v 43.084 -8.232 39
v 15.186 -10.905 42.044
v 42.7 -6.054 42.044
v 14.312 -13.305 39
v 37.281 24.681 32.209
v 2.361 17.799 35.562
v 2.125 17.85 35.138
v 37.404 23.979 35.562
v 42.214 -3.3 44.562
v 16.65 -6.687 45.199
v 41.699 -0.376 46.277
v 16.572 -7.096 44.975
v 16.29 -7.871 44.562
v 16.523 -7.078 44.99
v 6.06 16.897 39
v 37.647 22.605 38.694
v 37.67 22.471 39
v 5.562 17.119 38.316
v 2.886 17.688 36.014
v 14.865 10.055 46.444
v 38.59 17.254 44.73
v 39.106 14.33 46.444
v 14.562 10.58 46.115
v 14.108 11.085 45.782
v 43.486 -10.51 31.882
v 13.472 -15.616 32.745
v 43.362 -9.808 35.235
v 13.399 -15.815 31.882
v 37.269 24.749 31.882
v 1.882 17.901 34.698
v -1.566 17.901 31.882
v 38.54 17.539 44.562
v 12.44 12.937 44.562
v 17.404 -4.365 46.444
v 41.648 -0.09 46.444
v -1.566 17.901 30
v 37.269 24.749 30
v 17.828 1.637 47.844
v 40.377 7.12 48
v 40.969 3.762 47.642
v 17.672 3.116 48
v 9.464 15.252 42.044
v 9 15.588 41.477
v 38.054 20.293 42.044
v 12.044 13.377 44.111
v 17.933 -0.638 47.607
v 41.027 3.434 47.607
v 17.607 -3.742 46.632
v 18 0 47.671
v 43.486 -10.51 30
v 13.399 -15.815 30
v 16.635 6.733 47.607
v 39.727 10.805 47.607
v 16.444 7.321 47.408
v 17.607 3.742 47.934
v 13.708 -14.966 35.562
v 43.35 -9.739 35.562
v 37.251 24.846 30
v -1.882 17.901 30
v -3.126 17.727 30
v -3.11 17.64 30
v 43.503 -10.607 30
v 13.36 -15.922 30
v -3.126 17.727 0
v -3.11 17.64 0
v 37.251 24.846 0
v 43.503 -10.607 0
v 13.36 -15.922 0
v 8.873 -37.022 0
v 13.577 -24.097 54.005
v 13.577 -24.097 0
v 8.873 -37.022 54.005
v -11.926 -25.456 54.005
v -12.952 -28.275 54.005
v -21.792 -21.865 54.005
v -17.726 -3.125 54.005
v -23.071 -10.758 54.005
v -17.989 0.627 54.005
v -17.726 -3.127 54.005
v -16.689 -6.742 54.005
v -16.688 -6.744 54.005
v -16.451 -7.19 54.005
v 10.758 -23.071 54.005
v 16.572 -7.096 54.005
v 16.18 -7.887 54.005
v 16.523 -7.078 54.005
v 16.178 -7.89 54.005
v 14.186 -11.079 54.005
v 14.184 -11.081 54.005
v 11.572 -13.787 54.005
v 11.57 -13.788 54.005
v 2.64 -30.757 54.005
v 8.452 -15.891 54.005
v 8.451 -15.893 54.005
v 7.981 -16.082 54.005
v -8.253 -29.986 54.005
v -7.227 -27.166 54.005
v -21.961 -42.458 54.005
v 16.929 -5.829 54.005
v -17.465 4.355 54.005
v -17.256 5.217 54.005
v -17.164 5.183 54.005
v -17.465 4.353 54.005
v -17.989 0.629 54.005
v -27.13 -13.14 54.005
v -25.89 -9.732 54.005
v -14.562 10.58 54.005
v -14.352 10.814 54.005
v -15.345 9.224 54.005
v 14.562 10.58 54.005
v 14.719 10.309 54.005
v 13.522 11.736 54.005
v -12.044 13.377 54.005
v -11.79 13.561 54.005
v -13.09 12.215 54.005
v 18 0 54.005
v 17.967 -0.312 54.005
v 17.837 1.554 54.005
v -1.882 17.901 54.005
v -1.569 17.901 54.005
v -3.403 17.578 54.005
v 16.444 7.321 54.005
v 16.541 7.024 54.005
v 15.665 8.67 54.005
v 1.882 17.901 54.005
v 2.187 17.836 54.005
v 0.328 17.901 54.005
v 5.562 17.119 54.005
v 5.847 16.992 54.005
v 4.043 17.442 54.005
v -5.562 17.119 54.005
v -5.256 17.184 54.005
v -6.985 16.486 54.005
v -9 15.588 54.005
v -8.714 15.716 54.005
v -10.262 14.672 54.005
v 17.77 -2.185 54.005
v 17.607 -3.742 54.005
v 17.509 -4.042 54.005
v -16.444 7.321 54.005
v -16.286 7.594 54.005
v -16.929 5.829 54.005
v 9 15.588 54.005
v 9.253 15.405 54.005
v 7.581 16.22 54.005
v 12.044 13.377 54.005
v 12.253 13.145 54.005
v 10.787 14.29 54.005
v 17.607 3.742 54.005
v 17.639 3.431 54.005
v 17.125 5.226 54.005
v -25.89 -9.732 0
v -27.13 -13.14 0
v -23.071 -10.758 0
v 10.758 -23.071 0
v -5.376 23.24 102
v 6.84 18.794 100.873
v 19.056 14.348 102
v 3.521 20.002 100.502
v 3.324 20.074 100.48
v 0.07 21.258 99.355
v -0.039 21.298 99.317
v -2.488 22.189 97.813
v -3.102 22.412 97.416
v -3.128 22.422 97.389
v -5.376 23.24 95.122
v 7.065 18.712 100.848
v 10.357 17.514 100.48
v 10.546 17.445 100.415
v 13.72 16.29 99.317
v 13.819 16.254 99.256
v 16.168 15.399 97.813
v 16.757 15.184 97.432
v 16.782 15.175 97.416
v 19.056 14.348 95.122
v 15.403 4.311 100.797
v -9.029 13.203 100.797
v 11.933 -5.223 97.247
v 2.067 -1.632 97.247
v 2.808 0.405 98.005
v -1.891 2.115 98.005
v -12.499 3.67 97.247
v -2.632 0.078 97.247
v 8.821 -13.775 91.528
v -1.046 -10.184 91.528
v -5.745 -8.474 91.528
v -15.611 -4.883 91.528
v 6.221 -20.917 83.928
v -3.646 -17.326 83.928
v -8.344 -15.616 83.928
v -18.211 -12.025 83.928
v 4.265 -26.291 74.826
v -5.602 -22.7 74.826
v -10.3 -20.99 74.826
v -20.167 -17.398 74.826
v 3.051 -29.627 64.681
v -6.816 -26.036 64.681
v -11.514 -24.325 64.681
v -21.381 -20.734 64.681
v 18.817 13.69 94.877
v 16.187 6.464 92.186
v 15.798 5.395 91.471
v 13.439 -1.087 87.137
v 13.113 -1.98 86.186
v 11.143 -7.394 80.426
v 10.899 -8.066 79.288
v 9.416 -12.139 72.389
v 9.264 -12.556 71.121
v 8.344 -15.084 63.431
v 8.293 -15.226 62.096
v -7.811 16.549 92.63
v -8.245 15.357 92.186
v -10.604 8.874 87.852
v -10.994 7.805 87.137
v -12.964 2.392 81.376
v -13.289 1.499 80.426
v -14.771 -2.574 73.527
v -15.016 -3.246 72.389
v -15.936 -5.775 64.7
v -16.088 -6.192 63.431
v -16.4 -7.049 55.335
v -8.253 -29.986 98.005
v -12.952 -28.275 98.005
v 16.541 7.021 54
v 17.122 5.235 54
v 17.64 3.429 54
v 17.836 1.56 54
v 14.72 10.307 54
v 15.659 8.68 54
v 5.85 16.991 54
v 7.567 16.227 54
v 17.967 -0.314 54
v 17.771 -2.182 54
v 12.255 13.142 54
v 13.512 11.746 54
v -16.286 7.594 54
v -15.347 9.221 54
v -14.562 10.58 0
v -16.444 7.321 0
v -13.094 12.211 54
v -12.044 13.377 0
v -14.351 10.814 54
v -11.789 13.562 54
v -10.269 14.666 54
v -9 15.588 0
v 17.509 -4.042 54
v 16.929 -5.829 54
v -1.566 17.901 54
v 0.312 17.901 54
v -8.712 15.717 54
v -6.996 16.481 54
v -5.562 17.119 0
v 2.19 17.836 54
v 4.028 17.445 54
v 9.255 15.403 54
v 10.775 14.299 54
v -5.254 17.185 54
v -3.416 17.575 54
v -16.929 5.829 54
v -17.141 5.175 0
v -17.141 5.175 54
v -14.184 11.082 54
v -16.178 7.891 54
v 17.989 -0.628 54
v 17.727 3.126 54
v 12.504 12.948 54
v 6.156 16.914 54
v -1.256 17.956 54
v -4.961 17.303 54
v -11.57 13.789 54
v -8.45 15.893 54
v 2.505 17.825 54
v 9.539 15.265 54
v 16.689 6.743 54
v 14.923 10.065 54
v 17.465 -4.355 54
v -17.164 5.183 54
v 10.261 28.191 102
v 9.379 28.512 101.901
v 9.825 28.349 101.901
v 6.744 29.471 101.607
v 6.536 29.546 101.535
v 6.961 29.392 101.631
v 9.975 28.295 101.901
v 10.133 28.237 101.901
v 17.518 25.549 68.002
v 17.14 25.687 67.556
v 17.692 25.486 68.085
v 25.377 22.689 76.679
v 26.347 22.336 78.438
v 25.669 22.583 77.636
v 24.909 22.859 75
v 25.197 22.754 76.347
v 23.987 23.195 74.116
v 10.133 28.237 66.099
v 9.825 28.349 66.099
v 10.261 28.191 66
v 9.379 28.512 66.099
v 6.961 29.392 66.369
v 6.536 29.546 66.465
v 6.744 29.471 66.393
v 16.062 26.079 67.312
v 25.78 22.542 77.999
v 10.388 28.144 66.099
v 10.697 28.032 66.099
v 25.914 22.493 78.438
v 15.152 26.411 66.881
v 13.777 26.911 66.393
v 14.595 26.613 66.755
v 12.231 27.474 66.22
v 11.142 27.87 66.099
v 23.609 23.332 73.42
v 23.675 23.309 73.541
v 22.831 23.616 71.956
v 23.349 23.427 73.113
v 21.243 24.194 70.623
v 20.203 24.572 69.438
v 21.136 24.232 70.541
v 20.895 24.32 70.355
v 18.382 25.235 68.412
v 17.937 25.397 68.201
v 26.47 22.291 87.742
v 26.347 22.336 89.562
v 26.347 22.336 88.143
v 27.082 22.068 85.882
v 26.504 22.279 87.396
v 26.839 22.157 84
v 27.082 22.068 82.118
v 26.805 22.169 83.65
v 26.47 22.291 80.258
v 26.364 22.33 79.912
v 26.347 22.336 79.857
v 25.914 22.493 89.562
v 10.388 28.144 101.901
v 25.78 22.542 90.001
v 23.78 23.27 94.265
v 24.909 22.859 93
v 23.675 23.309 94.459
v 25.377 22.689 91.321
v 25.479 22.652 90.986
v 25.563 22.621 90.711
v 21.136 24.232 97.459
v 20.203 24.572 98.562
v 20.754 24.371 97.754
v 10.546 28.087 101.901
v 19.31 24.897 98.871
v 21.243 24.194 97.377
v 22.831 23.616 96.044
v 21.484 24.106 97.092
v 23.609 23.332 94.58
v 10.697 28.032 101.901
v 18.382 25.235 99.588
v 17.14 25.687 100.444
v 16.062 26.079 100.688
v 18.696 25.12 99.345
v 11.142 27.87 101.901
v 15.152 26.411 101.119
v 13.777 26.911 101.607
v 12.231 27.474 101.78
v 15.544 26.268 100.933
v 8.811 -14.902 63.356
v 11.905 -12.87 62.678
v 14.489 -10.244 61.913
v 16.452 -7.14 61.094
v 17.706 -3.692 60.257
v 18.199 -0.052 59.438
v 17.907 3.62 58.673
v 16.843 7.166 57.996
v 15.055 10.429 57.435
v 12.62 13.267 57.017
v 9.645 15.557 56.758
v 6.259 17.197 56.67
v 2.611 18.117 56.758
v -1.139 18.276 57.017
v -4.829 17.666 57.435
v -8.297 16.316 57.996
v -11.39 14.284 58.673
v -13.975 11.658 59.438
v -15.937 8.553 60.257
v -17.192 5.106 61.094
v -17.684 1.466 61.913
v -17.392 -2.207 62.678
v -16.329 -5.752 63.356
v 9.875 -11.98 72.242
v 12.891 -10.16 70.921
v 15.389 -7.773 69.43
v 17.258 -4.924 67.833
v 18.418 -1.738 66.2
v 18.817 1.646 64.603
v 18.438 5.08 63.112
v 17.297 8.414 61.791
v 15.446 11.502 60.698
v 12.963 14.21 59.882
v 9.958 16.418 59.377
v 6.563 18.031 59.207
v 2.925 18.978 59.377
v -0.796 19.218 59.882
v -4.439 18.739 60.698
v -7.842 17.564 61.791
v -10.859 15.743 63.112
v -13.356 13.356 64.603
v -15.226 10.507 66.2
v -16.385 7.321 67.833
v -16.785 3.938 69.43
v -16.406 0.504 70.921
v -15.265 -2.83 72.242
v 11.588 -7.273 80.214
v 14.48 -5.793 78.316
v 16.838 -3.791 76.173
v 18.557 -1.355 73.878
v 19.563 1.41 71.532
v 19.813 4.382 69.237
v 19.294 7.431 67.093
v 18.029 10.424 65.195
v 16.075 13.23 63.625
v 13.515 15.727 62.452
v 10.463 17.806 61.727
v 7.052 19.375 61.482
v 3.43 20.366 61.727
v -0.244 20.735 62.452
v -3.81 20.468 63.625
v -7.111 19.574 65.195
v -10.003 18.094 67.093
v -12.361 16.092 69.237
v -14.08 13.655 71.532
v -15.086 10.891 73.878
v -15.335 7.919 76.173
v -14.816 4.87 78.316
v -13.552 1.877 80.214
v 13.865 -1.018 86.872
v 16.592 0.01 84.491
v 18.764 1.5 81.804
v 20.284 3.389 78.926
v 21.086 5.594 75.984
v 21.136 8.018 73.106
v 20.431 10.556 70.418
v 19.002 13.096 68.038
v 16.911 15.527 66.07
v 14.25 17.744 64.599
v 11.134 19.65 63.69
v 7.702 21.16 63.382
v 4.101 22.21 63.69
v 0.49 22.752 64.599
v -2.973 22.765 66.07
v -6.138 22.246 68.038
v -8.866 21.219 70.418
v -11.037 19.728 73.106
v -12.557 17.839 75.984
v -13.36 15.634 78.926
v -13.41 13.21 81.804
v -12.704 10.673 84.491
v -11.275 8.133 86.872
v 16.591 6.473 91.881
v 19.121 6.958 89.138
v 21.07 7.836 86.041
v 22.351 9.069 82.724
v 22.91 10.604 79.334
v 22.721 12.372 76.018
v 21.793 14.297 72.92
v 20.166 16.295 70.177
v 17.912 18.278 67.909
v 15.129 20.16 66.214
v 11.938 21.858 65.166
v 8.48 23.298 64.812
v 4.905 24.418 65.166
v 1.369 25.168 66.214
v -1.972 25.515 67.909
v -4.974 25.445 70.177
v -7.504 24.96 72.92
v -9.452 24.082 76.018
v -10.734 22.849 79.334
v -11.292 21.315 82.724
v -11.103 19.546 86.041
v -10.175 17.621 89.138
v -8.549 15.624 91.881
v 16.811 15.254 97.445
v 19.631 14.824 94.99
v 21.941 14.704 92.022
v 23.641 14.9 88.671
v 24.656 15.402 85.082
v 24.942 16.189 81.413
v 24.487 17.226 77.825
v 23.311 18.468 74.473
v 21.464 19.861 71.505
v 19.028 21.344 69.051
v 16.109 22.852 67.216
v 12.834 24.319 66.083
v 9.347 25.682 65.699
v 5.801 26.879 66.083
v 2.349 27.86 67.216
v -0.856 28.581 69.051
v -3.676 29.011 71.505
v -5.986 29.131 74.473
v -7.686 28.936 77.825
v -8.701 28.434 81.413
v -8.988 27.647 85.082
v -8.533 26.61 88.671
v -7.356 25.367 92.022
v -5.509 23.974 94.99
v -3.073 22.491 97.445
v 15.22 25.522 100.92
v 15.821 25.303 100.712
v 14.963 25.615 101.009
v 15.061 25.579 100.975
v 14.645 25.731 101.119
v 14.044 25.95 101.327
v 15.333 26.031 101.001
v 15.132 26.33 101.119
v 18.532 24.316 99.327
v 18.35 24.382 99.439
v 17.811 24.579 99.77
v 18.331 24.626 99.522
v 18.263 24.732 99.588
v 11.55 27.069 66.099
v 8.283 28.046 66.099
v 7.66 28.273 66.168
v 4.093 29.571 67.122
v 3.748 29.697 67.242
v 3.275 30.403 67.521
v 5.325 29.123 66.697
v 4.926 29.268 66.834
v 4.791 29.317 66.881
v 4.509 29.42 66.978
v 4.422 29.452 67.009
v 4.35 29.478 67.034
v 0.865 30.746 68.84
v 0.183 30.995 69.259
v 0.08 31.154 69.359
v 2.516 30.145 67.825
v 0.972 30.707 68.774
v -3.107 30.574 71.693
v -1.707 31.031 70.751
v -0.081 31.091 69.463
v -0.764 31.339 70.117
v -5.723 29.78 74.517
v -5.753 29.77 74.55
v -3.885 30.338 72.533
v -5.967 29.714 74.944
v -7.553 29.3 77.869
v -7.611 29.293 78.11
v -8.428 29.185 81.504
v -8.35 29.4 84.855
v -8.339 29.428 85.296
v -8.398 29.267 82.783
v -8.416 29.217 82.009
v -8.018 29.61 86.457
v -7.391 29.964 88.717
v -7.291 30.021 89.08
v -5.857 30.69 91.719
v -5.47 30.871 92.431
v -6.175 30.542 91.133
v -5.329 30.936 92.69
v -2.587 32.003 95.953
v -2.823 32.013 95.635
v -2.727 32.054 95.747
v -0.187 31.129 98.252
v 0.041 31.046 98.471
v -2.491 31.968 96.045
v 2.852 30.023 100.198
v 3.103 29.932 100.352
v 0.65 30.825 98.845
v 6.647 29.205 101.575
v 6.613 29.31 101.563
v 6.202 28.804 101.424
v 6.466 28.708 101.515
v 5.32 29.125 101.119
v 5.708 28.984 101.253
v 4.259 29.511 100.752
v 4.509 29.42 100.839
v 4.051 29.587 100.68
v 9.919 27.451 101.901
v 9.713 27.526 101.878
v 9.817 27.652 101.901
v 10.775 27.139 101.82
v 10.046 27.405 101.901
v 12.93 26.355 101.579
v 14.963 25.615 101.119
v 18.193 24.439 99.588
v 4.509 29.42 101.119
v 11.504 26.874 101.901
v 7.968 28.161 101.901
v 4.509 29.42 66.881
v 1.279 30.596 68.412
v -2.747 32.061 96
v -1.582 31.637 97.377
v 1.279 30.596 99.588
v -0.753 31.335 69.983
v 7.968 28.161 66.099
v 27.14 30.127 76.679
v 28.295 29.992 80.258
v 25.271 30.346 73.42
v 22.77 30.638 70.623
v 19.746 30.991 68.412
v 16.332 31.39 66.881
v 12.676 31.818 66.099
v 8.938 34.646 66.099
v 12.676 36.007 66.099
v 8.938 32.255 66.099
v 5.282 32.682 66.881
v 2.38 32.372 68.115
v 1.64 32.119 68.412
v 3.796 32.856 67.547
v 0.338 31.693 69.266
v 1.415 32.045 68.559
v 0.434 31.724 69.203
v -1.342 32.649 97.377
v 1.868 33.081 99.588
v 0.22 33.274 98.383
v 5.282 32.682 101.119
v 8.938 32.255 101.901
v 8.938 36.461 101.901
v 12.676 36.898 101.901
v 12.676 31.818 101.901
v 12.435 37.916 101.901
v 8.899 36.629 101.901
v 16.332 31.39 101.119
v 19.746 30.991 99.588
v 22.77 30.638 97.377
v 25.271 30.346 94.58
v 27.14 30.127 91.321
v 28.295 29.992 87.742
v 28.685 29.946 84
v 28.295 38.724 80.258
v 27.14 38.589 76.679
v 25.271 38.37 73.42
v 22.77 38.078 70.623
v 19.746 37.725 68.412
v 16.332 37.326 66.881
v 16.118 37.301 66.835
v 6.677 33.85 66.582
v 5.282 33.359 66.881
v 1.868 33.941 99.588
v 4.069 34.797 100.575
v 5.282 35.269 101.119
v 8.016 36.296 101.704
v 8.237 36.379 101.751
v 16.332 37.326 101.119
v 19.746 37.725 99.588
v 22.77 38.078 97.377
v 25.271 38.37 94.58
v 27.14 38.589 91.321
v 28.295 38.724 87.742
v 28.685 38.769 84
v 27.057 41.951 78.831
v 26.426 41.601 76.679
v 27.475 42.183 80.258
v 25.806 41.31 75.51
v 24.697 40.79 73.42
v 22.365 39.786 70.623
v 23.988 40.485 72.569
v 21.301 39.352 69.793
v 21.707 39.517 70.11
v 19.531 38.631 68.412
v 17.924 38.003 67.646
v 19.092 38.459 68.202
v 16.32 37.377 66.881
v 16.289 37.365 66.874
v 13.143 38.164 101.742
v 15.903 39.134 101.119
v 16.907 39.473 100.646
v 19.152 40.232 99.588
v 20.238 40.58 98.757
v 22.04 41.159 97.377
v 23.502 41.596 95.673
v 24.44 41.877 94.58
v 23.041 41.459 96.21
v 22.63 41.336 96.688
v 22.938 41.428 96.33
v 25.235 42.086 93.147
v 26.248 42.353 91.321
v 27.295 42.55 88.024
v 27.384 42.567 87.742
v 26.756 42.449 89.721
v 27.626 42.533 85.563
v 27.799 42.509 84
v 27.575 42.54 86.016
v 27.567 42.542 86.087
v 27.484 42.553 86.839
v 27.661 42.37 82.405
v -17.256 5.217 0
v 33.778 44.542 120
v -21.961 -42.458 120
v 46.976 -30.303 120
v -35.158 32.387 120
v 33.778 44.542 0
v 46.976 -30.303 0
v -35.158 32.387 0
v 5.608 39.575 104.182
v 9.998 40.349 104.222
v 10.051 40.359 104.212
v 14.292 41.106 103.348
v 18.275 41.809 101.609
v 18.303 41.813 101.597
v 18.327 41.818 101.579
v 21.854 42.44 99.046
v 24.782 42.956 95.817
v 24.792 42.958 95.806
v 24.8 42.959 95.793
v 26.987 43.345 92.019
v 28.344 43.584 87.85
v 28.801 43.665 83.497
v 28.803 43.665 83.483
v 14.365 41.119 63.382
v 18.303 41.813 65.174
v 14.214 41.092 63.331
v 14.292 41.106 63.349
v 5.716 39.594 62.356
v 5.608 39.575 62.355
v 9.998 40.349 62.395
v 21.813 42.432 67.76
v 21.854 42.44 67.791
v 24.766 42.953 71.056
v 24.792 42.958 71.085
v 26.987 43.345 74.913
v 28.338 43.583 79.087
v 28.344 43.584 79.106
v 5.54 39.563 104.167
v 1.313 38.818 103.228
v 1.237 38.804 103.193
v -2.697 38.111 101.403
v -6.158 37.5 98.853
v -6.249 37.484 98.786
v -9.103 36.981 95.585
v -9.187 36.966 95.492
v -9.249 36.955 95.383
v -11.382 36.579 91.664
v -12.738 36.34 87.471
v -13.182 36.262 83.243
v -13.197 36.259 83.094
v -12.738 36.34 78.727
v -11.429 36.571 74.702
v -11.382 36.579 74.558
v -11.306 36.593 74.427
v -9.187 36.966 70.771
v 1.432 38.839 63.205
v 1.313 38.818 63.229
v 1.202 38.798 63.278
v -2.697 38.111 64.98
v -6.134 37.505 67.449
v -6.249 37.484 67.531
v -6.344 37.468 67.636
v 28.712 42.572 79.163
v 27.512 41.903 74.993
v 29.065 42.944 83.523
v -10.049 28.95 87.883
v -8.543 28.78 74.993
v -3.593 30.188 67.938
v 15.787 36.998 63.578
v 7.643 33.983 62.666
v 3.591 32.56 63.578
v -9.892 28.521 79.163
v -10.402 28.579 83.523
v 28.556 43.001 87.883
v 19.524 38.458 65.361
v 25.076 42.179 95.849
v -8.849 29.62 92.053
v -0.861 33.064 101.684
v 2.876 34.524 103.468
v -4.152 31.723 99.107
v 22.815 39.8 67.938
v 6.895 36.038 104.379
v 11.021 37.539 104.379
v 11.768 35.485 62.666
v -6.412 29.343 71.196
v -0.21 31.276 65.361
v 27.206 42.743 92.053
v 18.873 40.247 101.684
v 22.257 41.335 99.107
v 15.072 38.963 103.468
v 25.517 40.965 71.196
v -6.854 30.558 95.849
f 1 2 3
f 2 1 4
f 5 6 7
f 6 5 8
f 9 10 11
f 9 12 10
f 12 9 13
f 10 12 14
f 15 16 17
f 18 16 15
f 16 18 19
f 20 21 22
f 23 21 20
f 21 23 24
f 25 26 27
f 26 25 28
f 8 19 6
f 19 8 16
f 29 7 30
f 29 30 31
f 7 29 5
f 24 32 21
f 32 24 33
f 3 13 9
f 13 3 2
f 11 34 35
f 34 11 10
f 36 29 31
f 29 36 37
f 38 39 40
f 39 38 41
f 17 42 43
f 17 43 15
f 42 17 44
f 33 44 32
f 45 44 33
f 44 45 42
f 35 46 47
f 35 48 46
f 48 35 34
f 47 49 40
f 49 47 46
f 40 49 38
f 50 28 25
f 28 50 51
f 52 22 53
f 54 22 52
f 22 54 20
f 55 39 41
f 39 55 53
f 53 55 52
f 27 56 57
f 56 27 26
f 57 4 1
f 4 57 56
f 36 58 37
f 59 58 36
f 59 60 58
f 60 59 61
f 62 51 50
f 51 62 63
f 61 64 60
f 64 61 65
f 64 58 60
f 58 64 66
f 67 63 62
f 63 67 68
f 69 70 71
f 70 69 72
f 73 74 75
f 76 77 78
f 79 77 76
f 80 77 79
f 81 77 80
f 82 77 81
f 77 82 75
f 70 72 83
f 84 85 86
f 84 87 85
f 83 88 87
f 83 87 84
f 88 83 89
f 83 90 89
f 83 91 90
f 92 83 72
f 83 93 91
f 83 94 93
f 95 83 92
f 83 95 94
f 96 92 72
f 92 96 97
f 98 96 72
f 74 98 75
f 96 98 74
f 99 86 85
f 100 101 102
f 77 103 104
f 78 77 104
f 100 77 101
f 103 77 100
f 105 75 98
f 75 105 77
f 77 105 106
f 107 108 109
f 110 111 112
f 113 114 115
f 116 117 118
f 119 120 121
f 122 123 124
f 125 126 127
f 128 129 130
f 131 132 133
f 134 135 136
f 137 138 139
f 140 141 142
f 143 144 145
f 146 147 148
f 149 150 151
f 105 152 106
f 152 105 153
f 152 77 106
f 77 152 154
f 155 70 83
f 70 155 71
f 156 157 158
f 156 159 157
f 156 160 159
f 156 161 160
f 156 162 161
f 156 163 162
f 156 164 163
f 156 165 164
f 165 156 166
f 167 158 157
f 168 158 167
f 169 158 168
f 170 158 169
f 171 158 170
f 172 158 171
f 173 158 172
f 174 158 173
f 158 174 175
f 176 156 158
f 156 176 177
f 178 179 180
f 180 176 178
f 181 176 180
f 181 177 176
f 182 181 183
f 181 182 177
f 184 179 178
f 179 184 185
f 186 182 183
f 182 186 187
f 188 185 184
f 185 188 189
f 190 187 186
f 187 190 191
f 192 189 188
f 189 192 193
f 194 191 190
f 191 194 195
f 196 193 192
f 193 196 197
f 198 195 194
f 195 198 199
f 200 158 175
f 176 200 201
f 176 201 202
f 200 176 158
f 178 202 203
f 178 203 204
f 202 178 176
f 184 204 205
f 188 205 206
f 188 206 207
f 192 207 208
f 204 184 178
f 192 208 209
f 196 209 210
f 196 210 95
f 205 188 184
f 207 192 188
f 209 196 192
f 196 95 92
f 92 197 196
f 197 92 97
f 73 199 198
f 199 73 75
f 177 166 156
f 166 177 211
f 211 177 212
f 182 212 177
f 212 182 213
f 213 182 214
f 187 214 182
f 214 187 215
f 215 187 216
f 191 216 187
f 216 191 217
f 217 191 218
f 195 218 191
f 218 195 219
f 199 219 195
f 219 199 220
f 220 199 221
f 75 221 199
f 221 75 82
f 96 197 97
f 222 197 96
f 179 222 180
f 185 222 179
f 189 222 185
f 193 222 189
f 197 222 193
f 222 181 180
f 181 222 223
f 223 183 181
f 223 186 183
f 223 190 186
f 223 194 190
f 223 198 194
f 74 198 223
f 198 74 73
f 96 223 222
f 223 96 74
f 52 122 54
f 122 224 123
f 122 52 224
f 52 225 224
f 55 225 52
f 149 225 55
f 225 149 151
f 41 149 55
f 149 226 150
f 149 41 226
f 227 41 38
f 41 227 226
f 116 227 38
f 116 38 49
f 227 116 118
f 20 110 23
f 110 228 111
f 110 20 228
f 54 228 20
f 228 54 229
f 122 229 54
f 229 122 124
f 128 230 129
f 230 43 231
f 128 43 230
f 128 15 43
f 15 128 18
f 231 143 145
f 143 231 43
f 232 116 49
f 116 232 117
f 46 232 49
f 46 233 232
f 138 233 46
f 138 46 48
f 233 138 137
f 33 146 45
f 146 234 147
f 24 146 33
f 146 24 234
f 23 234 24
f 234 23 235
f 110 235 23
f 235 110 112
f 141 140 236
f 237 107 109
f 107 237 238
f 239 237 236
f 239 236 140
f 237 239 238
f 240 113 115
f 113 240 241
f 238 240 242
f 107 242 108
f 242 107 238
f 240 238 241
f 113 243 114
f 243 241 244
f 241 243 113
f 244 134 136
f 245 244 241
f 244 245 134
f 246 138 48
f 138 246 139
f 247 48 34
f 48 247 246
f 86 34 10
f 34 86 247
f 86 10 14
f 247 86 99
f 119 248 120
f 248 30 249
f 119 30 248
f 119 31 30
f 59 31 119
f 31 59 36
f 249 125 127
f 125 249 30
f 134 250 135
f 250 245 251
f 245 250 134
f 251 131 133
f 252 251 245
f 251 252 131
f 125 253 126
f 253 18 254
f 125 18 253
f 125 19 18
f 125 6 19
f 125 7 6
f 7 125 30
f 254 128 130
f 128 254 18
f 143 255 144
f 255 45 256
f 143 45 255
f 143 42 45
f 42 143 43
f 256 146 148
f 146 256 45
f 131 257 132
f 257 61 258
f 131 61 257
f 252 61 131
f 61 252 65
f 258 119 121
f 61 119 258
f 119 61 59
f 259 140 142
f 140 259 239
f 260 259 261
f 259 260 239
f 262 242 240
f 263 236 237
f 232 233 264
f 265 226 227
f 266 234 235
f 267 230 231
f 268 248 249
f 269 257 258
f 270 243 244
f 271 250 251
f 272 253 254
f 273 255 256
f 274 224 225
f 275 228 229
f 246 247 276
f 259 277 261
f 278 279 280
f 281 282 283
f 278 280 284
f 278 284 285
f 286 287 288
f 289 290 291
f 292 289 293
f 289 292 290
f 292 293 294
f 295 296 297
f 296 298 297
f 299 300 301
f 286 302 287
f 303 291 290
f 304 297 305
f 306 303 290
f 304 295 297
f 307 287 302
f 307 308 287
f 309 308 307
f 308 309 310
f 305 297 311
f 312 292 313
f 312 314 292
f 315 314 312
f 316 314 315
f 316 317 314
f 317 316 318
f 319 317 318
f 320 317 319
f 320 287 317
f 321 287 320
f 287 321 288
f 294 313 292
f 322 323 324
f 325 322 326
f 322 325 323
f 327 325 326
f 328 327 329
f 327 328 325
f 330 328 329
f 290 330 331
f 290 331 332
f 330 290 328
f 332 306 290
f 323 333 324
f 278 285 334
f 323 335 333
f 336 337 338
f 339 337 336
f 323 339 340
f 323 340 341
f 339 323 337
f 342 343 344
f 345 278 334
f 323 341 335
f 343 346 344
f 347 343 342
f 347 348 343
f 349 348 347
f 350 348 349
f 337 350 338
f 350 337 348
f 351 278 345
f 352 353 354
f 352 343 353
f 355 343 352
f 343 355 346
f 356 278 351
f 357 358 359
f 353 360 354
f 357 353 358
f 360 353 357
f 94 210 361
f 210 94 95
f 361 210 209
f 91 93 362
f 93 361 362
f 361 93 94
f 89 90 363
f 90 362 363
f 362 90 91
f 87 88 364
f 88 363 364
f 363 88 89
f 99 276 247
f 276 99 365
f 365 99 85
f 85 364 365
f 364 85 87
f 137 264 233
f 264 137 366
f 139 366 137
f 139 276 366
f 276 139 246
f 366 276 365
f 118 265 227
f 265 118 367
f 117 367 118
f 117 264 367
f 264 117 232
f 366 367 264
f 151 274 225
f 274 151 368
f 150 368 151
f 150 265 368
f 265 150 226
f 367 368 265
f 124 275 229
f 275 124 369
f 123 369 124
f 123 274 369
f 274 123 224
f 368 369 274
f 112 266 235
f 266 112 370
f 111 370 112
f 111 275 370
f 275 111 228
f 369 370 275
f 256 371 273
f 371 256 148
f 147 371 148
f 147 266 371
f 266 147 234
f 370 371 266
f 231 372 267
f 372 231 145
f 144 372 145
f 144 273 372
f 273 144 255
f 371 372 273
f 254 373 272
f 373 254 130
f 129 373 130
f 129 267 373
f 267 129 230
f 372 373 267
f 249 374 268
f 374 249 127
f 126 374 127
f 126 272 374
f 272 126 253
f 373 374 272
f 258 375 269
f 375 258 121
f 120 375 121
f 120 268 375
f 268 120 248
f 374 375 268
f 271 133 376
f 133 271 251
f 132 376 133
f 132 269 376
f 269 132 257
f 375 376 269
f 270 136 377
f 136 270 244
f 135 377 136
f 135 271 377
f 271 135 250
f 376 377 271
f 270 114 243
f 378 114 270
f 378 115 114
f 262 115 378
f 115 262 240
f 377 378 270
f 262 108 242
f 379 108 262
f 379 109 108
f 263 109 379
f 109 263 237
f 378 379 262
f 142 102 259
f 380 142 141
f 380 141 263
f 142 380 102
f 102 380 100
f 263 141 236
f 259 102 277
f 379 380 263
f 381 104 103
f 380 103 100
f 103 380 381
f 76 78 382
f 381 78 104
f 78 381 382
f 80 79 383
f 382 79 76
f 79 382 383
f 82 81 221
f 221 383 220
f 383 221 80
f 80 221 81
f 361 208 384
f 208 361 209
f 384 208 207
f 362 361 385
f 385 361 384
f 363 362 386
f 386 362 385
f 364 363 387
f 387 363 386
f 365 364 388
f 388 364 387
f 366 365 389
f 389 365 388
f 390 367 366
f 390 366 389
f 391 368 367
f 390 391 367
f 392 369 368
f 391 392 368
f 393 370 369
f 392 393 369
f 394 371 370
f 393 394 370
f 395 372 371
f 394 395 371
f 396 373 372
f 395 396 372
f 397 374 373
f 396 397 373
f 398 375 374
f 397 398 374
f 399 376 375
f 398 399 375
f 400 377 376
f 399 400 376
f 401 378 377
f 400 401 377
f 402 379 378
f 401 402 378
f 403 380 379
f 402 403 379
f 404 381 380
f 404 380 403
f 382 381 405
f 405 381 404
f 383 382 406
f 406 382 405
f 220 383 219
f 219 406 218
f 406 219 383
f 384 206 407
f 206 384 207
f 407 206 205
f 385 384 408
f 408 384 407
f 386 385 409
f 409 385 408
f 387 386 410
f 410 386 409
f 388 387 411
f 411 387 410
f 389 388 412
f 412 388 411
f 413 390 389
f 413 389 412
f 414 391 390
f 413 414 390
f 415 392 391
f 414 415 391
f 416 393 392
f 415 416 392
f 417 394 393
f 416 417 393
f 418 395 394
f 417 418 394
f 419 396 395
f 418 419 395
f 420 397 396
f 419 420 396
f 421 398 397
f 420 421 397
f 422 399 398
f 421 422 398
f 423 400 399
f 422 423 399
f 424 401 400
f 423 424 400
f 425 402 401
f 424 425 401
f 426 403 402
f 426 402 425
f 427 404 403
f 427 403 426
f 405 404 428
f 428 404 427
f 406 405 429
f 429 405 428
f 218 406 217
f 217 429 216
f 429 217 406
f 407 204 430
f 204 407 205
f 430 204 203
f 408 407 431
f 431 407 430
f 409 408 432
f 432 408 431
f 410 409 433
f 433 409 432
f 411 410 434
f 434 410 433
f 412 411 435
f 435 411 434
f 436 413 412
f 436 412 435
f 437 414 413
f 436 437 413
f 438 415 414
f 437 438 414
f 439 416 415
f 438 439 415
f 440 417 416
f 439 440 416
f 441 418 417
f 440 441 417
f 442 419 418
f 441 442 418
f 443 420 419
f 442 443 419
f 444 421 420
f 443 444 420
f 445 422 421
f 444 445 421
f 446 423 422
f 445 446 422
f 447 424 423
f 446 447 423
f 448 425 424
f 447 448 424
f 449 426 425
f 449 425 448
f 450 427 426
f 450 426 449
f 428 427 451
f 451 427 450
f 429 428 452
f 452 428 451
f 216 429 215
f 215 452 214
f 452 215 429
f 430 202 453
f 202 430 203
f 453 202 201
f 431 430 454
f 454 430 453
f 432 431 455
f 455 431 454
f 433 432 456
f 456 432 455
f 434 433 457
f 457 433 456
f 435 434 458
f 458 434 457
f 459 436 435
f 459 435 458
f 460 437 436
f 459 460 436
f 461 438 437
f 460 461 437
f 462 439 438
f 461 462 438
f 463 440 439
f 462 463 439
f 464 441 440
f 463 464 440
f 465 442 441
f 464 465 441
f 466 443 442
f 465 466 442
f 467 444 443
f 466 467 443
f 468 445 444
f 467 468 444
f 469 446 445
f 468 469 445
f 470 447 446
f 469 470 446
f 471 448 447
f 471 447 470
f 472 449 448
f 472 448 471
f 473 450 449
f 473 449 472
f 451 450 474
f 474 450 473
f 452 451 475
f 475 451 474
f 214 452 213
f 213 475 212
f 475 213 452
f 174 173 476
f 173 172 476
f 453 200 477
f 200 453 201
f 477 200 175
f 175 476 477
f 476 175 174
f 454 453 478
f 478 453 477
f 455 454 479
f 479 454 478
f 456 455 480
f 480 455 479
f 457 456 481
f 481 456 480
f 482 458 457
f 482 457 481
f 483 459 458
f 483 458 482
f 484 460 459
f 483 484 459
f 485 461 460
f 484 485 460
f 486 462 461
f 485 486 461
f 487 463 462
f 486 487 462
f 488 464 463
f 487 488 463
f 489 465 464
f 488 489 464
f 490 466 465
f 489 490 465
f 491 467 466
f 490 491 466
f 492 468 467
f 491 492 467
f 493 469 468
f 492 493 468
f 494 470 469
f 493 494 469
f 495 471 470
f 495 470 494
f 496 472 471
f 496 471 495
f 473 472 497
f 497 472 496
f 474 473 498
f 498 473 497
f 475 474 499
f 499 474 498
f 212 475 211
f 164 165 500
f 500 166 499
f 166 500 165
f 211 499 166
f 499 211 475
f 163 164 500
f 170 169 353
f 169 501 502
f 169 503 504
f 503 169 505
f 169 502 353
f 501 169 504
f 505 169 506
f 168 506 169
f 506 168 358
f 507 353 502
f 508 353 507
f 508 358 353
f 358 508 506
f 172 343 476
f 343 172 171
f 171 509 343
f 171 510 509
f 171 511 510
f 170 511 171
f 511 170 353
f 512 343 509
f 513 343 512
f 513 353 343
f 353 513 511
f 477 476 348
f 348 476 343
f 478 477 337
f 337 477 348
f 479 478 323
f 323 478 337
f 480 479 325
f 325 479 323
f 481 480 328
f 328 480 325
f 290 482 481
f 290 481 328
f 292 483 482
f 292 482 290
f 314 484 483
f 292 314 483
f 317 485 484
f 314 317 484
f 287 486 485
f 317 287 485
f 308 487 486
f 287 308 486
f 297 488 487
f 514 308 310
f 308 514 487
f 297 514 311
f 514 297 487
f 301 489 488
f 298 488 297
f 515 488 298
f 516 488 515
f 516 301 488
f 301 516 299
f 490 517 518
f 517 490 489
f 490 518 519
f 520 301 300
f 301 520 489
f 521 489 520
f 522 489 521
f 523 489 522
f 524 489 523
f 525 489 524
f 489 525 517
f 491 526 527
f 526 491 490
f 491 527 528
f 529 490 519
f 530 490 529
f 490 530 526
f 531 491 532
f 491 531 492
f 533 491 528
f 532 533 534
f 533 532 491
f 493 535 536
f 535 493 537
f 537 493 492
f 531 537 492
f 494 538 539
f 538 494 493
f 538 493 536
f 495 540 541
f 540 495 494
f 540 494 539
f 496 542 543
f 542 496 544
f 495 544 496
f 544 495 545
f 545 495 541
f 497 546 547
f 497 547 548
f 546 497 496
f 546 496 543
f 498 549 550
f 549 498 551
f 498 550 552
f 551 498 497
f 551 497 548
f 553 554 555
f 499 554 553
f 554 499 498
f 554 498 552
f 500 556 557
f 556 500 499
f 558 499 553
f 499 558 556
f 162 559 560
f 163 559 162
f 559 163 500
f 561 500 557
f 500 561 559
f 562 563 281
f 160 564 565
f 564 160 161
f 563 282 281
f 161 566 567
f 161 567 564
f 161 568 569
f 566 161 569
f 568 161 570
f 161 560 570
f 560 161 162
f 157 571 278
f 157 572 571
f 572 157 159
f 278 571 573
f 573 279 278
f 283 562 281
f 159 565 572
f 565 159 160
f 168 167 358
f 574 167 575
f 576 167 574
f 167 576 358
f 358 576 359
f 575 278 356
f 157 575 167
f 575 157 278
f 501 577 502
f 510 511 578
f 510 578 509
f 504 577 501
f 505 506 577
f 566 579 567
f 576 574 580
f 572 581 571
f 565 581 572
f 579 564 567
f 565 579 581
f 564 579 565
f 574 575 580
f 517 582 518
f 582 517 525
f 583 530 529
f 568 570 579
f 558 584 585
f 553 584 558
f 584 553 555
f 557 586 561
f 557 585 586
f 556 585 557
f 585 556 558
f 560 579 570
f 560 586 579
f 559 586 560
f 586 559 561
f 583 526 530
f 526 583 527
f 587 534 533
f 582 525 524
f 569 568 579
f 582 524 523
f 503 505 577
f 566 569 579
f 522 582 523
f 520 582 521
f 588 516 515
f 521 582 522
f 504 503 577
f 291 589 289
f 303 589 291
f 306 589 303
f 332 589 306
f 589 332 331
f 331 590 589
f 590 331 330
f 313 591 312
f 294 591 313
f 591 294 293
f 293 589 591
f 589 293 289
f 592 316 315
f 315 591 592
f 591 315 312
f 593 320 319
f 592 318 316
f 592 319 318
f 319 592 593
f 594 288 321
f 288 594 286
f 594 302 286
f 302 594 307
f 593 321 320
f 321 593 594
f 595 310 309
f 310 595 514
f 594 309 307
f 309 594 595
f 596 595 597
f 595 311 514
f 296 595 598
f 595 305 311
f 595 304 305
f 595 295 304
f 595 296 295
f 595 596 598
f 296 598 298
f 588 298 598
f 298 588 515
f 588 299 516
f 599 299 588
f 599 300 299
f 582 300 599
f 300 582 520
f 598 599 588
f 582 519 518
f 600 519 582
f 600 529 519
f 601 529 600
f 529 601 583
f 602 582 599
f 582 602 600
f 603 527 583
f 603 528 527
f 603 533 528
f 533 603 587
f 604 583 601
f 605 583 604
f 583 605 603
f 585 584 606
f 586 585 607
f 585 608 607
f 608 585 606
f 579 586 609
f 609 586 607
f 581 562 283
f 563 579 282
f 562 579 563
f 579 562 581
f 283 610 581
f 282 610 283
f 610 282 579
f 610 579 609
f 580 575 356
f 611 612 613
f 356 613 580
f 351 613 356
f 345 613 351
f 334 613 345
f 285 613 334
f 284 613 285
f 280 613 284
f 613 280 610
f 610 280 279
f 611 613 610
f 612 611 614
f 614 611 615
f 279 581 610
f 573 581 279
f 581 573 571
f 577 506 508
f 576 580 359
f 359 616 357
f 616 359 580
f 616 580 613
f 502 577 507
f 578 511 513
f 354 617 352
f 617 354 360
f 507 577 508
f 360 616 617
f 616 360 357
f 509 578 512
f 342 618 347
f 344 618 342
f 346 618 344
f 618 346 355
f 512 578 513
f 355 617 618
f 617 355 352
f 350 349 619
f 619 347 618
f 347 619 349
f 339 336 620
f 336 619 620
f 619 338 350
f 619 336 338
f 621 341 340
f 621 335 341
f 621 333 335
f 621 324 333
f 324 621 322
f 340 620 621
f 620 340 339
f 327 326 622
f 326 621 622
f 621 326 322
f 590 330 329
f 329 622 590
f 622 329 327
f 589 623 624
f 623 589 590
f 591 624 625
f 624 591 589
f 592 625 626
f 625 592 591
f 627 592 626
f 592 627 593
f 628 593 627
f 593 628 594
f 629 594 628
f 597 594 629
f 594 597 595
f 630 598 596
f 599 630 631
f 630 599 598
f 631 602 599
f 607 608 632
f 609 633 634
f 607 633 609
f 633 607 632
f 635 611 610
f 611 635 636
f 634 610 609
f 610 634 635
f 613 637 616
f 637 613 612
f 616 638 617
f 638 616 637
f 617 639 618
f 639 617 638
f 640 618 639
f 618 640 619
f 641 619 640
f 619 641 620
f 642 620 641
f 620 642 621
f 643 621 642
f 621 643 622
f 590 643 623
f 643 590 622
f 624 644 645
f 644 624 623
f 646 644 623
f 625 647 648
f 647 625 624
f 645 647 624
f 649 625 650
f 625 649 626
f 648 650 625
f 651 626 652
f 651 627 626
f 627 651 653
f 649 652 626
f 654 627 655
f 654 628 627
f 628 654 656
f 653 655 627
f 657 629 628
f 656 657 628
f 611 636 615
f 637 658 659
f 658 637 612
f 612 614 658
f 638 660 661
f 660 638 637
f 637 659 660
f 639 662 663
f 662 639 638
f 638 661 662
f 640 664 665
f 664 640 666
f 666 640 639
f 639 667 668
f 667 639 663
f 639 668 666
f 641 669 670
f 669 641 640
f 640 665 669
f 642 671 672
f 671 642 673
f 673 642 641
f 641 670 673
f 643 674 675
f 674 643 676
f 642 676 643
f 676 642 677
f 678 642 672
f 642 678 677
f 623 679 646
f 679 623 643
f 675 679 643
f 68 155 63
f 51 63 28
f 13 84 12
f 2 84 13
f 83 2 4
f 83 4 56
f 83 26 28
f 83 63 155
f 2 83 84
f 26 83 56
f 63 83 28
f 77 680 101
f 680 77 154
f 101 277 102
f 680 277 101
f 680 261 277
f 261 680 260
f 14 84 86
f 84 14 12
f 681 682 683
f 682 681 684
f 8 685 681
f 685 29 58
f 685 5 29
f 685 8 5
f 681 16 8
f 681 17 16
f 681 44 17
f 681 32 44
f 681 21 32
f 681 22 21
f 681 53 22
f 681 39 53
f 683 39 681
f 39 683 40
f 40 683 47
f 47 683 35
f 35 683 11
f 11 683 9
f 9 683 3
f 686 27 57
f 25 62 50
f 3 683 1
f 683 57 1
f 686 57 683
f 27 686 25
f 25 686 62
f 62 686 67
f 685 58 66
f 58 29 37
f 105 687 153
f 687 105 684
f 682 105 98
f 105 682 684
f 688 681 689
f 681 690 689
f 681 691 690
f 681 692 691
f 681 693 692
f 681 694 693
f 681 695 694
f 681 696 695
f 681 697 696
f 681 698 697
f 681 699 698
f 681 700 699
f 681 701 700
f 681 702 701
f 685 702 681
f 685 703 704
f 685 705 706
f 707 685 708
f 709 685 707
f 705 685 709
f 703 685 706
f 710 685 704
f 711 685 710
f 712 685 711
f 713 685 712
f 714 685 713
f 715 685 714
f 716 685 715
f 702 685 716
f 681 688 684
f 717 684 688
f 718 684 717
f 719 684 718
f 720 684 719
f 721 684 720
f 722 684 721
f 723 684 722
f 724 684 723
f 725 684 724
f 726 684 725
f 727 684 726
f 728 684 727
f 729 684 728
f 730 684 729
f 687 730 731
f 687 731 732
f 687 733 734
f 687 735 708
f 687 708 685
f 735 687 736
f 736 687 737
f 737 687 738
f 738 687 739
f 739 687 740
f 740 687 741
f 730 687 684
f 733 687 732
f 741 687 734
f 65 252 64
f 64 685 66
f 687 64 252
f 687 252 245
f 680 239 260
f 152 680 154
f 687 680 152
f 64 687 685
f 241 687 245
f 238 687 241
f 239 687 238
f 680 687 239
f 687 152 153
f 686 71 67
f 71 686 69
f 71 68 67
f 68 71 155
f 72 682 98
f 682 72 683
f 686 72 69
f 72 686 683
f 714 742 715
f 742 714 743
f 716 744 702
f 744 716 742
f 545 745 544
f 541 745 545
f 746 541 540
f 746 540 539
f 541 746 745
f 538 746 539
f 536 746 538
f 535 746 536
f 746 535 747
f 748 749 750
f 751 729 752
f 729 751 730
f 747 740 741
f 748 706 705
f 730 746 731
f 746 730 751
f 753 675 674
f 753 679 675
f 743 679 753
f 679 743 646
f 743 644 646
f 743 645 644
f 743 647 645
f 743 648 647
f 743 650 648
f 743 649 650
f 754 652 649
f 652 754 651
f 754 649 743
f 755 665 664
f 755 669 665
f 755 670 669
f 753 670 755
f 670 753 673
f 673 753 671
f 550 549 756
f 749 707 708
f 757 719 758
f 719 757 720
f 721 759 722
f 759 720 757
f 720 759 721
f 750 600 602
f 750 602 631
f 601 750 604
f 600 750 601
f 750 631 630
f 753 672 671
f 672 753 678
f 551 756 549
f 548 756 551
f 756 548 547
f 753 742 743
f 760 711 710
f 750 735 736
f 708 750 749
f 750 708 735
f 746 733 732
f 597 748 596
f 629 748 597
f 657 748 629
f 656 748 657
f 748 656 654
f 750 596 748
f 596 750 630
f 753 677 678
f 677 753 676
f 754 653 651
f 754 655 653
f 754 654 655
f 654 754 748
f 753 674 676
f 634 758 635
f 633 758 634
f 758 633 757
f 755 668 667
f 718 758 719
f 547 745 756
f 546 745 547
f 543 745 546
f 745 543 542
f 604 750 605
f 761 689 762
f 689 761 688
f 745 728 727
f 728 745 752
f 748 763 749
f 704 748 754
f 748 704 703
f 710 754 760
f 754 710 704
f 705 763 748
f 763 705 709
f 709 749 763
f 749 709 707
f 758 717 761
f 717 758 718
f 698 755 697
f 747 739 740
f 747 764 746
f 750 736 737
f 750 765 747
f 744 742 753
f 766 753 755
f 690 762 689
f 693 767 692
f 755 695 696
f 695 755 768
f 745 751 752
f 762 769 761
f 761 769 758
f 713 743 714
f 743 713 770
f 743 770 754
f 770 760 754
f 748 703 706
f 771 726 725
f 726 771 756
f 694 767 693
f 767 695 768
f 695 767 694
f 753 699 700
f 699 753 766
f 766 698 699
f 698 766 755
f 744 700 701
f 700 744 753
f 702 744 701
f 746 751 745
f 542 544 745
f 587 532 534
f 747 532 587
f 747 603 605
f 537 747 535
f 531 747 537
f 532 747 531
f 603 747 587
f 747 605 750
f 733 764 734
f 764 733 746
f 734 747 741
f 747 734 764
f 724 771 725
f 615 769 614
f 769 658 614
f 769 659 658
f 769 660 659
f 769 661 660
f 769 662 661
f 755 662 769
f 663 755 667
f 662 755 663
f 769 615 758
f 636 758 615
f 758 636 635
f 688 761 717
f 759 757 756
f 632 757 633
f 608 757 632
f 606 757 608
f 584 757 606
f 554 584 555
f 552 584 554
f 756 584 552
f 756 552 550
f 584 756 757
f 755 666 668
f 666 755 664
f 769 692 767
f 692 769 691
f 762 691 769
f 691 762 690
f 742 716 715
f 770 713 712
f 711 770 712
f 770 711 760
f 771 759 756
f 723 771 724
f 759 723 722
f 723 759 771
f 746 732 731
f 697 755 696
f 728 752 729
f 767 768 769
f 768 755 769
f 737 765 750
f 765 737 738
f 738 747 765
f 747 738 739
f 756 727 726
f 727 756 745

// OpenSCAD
// ******************************************** //
// *                                          * //
// *  Cover for a VUK on home-brew pinball    * //
// *                                          * //
// *  Dorus van der Linden                    * //
// *  Willem Godlieb                          * //
// *                                          * //
// *  Version 0.2                             * //
// *                                          * //
// *  To Do:                                  * //
// *    - Add holes for inserts M3            * //
// *    - Create ball path variables          * //
// *    -                                     * //
// *                                          * //
// ******************************************** //



// ******************************************** //
// *                                          * //
// *                Instructions              * //
// *                                          * //
// *  Definition of origin                    * //
// *    Centre x, left allign y , and zero z  * //
// *    Then extra translations as needed     * //
// *                                          * //
// *  All angles are counter clockwise        * //
// *    as seen from outside of axis          * //
// *                                          * //
// *  Create 3 elements:                      * //
// *  A - VUK Case Cube at z-angle 10         * //
// *  B - PVC Tube at z-angle 20, x-angle -3  * //
// *  C - Ballpath & VUK at z-angle -20       * //
// *                                          * //
// *  Final product is difference A-B-C       * //
// *                                          * //
// *        playfield is at y-angle -5        * //
// *                                          * //
// *                                          * //
// ******************************************** //



// ******************************************** //
// *                Variables                 * //
// ******************************************** //


// *                Render Resolution
// *                
//$fn=180;

// *                Margins
// *   
// Margin for objects to be merged or removed
MarginSize=0.010;
//MarginSize=10;

MarginTranslate=MarginSize/2;


// *                VUK Case Cube
// *                
// VUK Case Cube - Size
Case_x=70;
Case_y=76;
Case_z=120;

// VUK Case Cube - Positioning
Case_Translation        = [6,0,0];                  // Translation of VUK case
Case_Rotation           = [0,0,10];                 // Rotation of VUK case
Case_RotationReverse    = [0,0,-10];                // Rotation of VUK case


// *                PVC tube
// *
// PVC Tube - Size
PVC_ID                  = 36;                       // PVC tube inner diameter
PVC_WT                  = 3;                        // PVC tube wall thickness
PVC_OD                  = PVC_ID + 2* PVC_WT;       // PVC tube outer diameter = 42
LenghtHorizontalPVC     = 240;                      // PVC tube lenghts - NOT PRINTED

// PVC Tube - Positioning 
PVC_dx                  = 21;                       // How far should the tupe be away from x=0 
PVC_dy                  = 26;                       // How far should the tupe be away from y=0 
PVC_dz                  = 64;                       // How far should the tupe be away from z=0 
PVC_Translation         = [PVC_dx,PVC_dy,PVC_dz];   // Total translation of the tube
PVC_Rotation            = [-3,0,20];                // Rotation of tube

// *                VUK & Ball Path 
// * 
// VUK
VUK_Width               = 26;                       // Width of arc of VUK
VUKr                    = 48;                       // High of arc of VUK 
VUKthickness            = 10;                       // Thickness of extruded arc
blockVUKx               = 42;                       // Size of hole for lower part of VUK
blockVUKy               = 30;                       // Size of hole for lower part of VUK
blockVUKz               = 54;                       // Size of hole for lower part of VUK
TopedgeVUKx             = 5;                        // Size of hole for top edge part of VUK
TopedgeVUKy             = 35;                       // Size of hole for top edge part of VUK
TopedgeVUKz             = 98;                       // Size of hole for top edge part of VUK
TopEdgeVuk_Translate    = [0,17,0];                 // Measured translation of VUK top edge from block
RotationOfVUK           = [0,0,-20];                // Rotation of VUK
VUKTranslation          = [0,-48,0];                // Measured translation of VUK from center

// Ball Path
// To be created from numbers in modules            // To Be created

// *                VUK Case - Final Part
// * 
// Case Entry Hole
EntryHole_x=45;                                     // x of cube and lenght of cylinder used to create entry hole
EntryHole_y=PVC_ID;                                 // y of cube and diameter of cylinder used to create entry hole
EntryHole_z=30;                                     // Height of cube and center of cylinder used to create entry hole




// ******************************************** //
// *                Modules                   * //
// ******************************************** //
//
//
// *                VUK Case Cube
// * 
// VUK Case Full Cube                               // Not merged or part that is removed so NO margin
module VUKCasingCube(Reduced_y=0)
{
    rotate(Case_Rotation)
    translate(Case_Translation)
    
    // Centre x, left allign y , and zero z 
    translate([-(Case_x/2),-(Case_y/2),0])
    cube([Case_x,Case_y-Reduced_y,Case_z]);
}
//
//
// *                PVC tube
// *
// * Modules PVC tube on exit
module HollowHorizontalTube()                       // Not merged or part that is removed so NO margin
{
    rotate(PVC_Rotation) translate(PVC_Translation) 
    difference()
    {
        FullHorizontalTube();
        InnerHorizontalTube();
    }
}


module FullHorizontalTube()                         // Not merged, removed but meant to be precise so NO margin
{
    // Centre x, left allign y , and zero z 
    translate([0,LenghtHorizontalPVC/2,PVC_OD/2])
    rotate([-90,0,0])
    cylinder(h=LenghtHorizontalPVC,d=PVC_OD,center=true);
}


module InnerHorizontalTube()                        // Part that is removed so use margin
{
    // Centre x, left allign y , and zero z 
    translate([0, LenghtHorizontalPVC/2 , PVC_OD/2])
    rotate([-90,0,0])
    cylinder(h=(LenghtHorizontalPVC + MarginSize), d=PVC_ID, center=true);
}
//
//
// *                VUK Case - Final Part
// * 
// Entry Hole
module CaseEntryHole()                              // Part that is removed so use margin
{
    //hole arc
    rotate(Case_Rotation)
    translate([EntryHole_x/2,0,EntryHole_z])
    rotate([0,90,0])
    cylinder(h=EntryHole_x,d=EntryHole_y,center=true);
    //hole base
    rotate(Case_Rotation)
    translate([EntryHole_x/2 ,0,EntryHole_z/2- MarginTranslate])
    cube([EntryHole_x,EntryHole_y,EntryHole_z+MarginSize], center=true);
}

module CaseExitHole()                               // Not merged, removed but meant to be precise so NO margin
{
    // remove outer diameter PVC exit hole
    rotate(PVC_Rotation)        
    translate(PVC_Translation)
    FullHorizontalTube();
}

// VUK Case Final Part                              // Final Part so NO margin
module VUKCasing()
{
    difference()
    {
        VUKCasingCube();
        
        // remove entry archway
        CaseEntryHole();
        
        // remove exit hole and PVC tube connection
        CaseExitHole();

        // ********************  TO DO **************** /

        //remove VUKandBallPath
        VUKandBallPath();
    }
}



//
//
// *                VUK & Ball Path
// * 
// Cube part of VUK
module BlockVUK()                                   // Part that is removed so use margin
{
    // Centered correctly
    translate([-blockVUKx/2,0,-MarginTranslate])
    cube([blockVUKx,blockVUKy, blockVUKz+MarginSize]);
}

// Arc part of VUK
module ArcVUK()                                     // Overlap is in lower parts of VUK so NO margin
{
    // Centered correctly
    translate([-VUK_Width/2,VUKr,0])
    //create Arc
    rotate([180,-90,0])
    rotate_extrude(angle=90,convexity = 10)
    translate([VUKr-VUKthickness,0,0])
    square(size = [VUKthickness, VUK_Width], center = false);
}

//TopEdge part of VUK
module TopedgeVUK()                                 // Part that is removed so use margin
{
    // Centered correctly
    translate([-TopedgeVUKx/2,0,-MarginTranslate])
    cube([TopedgeVUKx,TopedgeVUKy, TopedgeVUKz+MarginSize]);
}


// Combined VUK
module VUK()                                        //  Merged part with margins in it so NO extra margin
{
    //Move entire VUK
    rotate(RotationOfVUK)
    translate(VUKTranslation)                            // measured
    
    union()
    {
        BlockVUK();
        
        translate([0,blockVUKy-VUKthickness,blockVUKz])     // Move match BlockVUK (block y - arc thickness) and to stand on top of BlockVUK 
        ArcVUK();
        
        translate(TopEdgeVuk_Translate) 
        TopedgeVUK();             
    }
}

//
// Ball Path Modules
module Ballpath1()                                  // Part that is removed so use margin
{
    translate([0,0,-MarginTranslate])
    cylinder(h=blockVUKz+MarginSize,d=PVC_ID,center=false);
}



module Ballpath2()                                  // Overlap is in lower parts of VUK so NO margin
{
    rotate(RotationOfVUK)

    //Raise z to stand on top of Ballpath1
    translate([0,0,blockVUKz])
    
    // Centered correctly
    translate([0,30,0])
    rotate([90,0,-90])
    rotate_extrude(angle=90,convexity = 10)
    translate([30,0,0])
    circle(d=PVC_ID);
}



module Ballpath3()                                  // Overlap in measurements so NO extra margin
{

    //Raise z to fit with overlap to Ballpath2
    translate([7,20,blockVUKz+30])                  // Manual fitting
    rotate([-90,90,-20]) 
        
    // Centered correctly
    translate([0,20,8])
    rotate([90,0,-90])
    rotate_extrude(angle=40,convexity = 10)
    translate([20,0,0])
    circle(d=PVC_ID);
}


module BallPath4()                                   // Part that is removed so use margin
{
    rotate(RotationOfVUK)
    translate([-PVC_ID/2,-PVC_ID/2-1,0-MarginTranslate])
    cube([PVC_ID,PVC_ID/2,blockVUKz+MarginSize]);
}



module BallPath5()                                   // Overlap in measurements so NO extra margin
{
    rotate(RotationOfVUK)
    union()
    {
        translate([-VUK_Width/2,-8,blockVUKz+15])   // Manual fitting
        cube([VUK_Width,18,22]);                    // Manual fitting    
    
        translate([-VUK_Width/2,-19,blockVUKz])     // Manual fitting
        cube([VUK_Width,12,26]);                    // Manual fitting
    }
}








module CombinedBallPath()
{
    union()
    {
        Ballpath1();
        Ballpath2();
        Ballpath3();
        BallPath4();
        BallPath5();
    }
}


//
// Conbined VUK and Ball Path
module VUKandBallPath()
{
    union()
    {
        VUK();
        CombinedBallPath();
    }
}


//
//
// *                Render
// Render Final part
VUKCasing();

// Optional Render
//color("green")HollowHorizontalTube();
